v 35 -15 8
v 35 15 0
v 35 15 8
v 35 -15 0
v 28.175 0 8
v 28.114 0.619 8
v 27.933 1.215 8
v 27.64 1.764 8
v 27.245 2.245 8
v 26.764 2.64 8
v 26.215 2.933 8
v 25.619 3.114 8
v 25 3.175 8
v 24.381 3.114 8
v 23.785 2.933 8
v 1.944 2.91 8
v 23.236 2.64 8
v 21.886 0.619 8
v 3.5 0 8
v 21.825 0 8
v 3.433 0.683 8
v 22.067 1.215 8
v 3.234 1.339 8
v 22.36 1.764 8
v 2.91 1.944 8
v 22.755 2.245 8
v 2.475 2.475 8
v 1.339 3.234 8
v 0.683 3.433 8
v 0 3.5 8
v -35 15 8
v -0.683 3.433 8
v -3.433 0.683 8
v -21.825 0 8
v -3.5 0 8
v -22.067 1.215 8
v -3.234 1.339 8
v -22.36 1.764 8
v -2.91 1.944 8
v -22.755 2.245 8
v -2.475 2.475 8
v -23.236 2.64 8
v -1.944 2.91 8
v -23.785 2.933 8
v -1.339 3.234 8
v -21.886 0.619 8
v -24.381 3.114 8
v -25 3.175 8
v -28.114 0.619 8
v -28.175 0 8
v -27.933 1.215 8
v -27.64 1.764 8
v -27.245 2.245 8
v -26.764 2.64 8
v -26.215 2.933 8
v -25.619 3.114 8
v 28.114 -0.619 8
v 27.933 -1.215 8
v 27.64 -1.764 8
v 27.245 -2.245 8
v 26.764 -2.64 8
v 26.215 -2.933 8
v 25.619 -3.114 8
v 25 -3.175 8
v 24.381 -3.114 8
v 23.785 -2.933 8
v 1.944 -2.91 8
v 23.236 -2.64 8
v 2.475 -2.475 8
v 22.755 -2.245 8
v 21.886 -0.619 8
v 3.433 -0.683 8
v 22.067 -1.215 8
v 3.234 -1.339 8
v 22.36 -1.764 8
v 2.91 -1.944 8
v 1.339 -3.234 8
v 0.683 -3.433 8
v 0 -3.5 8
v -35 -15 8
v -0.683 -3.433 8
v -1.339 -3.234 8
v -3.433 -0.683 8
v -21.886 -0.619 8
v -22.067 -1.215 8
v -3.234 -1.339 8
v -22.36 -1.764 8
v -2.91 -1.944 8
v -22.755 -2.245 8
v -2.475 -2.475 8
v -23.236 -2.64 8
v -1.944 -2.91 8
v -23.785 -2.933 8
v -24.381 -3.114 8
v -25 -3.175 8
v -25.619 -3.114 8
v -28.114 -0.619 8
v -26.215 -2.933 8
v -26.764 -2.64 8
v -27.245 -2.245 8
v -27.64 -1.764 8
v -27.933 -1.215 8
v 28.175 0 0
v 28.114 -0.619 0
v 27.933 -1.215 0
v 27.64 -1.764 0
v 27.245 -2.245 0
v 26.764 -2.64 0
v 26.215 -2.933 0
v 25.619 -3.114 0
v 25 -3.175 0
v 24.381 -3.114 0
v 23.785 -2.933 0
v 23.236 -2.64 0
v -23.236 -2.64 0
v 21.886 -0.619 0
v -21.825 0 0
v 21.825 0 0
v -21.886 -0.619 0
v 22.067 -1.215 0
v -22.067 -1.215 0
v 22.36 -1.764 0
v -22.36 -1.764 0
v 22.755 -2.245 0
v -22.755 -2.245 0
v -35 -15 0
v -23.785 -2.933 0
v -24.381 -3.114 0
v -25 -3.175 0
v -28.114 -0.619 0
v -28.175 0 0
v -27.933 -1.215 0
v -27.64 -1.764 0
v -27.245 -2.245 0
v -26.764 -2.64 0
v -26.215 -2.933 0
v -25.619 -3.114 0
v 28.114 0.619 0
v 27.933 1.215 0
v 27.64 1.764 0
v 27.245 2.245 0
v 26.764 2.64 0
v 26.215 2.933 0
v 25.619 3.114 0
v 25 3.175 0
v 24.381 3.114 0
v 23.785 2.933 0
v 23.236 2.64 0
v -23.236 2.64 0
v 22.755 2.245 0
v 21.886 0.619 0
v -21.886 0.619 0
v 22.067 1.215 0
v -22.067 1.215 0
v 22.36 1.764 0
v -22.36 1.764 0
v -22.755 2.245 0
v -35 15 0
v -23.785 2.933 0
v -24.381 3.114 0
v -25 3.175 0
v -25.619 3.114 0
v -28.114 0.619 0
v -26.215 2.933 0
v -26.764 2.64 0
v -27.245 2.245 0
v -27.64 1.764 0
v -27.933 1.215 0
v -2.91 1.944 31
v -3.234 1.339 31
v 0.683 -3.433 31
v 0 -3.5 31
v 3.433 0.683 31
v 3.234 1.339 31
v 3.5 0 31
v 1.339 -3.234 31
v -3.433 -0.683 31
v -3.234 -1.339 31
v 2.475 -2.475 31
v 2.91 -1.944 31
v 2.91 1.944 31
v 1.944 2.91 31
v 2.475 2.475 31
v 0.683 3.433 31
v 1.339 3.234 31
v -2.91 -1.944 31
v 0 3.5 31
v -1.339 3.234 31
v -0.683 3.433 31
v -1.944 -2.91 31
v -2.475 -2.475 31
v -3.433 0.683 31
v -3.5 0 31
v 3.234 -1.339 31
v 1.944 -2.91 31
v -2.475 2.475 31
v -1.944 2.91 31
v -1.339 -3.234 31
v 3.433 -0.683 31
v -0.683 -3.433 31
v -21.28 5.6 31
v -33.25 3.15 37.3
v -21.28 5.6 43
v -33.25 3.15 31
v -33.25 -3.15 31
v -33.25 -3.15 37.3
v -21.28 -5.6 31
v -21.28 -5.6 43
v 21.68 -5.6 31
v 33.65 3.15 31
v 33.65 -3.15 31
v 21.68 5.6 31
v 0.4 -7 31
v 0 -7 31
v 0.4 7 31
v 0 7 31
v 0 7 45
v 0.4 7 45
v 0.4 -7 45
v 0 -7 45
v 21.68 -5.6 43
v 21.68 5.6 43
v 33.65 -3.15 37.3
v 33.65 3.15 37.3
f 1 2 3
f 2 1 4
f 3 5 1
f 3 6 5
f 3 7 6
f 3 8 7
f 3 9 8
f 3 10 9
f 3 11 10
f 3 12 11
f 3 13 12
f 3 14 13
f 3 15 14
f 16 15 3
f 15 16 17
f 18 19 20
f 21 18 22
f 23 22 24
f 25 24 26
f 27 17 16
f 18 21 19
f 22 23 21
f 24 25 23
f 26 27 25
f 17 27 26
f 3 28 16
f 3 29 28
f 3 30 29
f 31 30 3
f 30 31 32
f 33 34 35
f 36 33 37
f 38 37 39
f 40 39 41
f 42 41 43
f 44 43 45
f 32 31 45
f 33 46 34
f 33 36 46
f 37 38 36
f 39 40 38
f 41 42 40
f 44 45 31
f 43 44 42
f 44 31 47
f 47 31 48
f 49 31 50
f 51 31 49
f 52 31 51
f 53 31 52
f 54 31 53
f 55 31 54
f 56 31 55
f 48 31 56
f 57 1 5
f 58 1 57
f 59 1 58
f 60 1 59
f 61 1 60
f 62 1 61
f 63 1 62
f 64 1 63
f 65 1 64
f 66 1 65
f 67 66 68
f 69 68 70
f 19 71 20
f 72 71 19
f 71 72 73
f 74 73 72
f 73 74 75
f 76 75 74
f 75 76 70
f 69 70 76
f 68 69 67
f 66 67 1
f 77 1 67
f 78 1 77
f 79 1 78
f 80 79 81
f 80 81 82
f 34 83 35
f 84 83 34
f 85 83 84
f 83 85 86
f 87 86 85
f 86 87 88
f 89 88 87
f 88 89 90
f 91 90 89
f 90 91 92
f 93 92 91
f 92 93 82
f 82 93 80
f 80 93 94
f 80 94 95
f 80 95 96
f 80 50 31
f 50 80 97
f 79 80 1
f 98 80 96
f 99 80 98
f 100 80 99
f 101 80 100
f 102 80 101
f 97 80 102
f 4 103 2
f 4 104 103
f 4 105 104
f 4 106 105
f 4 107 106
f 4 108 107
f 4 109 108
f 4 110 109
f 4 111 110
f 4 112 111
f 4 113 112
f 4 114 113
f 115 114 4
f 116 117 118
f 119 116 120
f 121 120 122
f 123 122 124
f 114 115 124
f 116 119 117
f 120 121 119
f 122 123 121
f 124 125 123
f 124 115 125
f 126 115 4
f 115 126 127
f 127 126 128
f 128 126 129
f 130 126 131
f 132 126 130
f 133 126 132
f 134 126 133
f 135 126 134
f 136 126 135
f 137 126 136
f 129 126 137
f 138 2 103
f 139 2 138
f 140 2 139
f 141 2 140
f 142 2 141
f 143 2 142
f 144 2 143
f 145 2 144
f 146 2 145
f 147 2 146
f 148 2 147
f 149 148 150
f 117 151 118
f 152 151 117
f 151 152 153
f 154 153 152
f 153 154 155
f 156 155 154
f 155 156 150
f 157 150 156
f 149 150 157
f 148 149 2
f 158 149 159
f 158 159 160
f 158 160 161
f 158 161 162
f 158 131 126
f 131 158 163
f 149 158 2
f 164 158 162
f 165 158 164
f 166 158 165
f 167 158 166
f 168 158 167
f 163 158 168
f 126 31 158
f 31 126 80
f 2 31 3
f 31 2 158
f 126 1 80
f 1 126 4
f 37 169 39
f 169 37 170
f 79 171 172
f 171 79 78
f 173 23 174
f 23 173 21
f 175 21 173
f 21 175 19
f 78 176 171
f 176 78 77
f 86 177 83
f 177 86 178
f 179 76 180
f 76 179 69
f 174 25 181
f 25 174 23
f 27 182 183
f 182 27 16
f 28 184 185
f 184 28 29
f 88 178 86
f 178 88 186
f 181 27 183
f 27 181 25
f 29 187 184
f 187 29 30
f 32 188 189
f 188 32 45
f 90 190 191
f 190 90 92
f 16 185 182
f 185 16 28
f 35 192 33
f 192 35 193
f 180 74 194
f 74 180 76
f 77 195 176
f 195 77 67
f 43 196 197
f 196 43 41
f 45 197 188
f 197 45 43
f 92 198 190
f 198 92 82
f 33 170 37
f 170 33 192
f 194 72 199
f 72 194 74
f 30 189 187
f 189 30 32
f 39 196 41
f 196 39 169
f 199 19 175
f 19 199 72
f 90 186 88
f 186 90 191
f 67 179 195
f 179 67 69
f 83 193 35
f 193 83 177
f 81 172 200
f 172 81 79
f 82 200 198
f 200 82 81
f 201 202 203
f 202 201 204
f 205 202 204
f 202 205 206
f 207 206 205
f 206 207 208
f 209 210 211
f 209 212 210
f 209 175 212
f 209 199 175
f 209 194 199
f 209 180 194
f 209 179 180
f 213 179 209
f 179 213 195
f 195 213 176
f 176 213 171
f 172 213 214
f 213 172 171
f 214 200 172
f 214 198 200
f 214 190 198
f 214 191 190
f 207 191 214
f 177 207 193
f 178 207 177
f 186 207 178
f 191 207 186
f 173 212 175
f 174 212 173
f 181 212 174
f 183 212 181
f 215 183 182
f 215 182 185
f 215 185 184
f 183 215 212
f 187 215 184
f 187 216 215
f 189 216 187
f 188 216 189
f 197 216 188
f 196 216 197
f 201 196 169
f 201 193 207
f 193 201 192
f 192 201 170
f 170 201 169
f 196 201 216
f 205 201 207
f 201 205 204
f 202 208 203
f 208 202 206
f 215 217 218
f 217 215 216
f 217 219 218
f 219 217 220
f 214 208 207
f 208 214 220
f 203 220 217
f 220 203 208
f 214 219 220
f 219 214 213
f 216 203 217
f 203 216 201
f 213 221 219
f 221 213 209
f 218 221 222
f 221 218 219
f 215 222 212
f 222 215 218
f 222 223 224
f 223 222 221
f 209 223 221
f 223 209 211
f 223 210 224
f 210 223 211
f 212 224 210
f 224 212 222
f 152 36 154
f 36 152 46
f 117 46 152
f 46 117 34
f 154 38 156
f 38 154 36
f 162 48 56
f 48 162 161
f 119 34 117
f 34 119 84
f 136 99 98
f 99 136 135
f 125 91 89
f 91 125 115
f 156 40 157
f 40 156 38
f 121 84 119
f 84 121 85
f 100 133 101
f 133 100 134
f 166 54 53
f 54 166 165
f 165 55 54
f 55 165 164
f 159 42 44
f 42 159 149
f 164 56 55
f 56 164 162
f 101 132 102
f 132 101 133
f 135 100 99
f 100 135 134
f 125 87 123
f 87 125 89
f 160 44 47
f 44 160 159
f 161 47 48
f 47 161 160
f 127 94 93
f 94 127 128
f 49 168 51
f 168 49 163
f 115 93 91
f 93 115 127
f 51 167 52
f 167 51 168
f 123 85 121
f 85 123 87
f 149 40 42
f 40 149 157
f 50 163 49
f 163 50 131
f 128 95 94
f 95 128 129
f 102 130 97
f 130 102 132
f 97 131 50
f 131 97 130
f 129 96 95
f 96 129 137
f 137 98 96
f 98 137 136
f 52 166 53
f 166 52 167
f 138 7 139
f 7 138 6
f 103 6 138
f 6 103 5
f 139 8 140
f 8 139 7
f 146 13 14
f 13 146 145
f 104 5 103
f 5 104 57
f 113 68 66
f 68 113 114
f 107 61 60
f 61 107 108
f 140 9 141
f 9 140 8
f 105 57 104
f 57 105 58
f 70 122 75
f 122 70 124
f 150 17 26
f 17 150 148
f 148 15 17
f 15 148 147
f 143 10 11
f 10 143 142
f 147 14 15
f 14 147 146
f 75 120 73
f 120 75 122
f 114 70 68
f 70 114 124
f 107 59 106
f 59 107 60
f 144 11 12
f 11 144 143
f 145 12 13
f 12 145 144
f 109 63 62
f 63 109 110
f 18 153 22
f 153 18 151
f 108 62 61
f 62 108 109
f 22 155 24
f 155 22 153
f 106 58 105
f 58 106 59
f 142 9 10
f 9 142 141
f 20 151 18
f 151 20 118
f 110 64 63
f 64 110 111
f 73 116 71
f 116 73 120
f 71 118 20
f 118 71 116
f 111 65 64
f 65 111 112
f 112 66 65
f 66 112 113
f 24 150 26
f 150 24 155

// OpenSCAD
$fn = 32;

// ----------------------------------------------------------------------
// Boat cleat: 70 mm base, horn 38 mm up
// ----------------------------------------------------------------------

// --- parameters (mm) ---
base_l = 70;              // base length
base_w = 30;              // base width
base_t = 8;               // base thickness
horn_len = 66.5;          // horn length
horn_d = 14;              // horn diameter at the middle
horn_z = 38;              // horn axis height
end_drop = 8;             // how far the horn tips drop
post_d = 7;               // centre post diameter
holes_d = 6.35;           // fixing holes
hole_x = 25;              // fixing hole spacing

difference() {
  union() {
    translate([-35, -15, 0]) cube([base_l, base_w, base_t]);
    /* centre post, sunk 1 mm into the base */
    translate([0, 0, 7]) cylinder(h = 31, d = post_d);
    /* horn: a hull chain of boxes, full in the middle and lighter at the tips */
    hull() {
      translate([-33.25, -3.15, 31]) cube([0.4, 6.3, 6.3], center = false);
      translate([-21.28, -5.6, 31]) cube([0.4, 11.2, 12], center = false);
    }
    hull() {
      translate([-21.28, -5.6, 31]) cube([0.4, 11.2, 12], center = false);
      translate([0, -7, 31]) cube([0.4, 14, 14], center = false);
    }
    hull() {
      translate([0, -7, 31]) cube([0.4, 14, 14], center = false);
      translate([21.28, -5.6, 31]) cube([0.4, 11.2, 12], center = false);
    }
    hull() {
      translate([21.28, -5.6, 31]) cube([0.4, 11.2, 12], center = false);
      translate([33.25, -3.15, 31]) cube([0.4, 6.3, 6.3], center = false);
    }
  }
  translate([-25, 0, -2.5]) cylinder(h = base_t + 5, d = holes_d);
  translate([25, 0, -2.5]) cylinder(h = base_t + 5, d = holes_d);
}
